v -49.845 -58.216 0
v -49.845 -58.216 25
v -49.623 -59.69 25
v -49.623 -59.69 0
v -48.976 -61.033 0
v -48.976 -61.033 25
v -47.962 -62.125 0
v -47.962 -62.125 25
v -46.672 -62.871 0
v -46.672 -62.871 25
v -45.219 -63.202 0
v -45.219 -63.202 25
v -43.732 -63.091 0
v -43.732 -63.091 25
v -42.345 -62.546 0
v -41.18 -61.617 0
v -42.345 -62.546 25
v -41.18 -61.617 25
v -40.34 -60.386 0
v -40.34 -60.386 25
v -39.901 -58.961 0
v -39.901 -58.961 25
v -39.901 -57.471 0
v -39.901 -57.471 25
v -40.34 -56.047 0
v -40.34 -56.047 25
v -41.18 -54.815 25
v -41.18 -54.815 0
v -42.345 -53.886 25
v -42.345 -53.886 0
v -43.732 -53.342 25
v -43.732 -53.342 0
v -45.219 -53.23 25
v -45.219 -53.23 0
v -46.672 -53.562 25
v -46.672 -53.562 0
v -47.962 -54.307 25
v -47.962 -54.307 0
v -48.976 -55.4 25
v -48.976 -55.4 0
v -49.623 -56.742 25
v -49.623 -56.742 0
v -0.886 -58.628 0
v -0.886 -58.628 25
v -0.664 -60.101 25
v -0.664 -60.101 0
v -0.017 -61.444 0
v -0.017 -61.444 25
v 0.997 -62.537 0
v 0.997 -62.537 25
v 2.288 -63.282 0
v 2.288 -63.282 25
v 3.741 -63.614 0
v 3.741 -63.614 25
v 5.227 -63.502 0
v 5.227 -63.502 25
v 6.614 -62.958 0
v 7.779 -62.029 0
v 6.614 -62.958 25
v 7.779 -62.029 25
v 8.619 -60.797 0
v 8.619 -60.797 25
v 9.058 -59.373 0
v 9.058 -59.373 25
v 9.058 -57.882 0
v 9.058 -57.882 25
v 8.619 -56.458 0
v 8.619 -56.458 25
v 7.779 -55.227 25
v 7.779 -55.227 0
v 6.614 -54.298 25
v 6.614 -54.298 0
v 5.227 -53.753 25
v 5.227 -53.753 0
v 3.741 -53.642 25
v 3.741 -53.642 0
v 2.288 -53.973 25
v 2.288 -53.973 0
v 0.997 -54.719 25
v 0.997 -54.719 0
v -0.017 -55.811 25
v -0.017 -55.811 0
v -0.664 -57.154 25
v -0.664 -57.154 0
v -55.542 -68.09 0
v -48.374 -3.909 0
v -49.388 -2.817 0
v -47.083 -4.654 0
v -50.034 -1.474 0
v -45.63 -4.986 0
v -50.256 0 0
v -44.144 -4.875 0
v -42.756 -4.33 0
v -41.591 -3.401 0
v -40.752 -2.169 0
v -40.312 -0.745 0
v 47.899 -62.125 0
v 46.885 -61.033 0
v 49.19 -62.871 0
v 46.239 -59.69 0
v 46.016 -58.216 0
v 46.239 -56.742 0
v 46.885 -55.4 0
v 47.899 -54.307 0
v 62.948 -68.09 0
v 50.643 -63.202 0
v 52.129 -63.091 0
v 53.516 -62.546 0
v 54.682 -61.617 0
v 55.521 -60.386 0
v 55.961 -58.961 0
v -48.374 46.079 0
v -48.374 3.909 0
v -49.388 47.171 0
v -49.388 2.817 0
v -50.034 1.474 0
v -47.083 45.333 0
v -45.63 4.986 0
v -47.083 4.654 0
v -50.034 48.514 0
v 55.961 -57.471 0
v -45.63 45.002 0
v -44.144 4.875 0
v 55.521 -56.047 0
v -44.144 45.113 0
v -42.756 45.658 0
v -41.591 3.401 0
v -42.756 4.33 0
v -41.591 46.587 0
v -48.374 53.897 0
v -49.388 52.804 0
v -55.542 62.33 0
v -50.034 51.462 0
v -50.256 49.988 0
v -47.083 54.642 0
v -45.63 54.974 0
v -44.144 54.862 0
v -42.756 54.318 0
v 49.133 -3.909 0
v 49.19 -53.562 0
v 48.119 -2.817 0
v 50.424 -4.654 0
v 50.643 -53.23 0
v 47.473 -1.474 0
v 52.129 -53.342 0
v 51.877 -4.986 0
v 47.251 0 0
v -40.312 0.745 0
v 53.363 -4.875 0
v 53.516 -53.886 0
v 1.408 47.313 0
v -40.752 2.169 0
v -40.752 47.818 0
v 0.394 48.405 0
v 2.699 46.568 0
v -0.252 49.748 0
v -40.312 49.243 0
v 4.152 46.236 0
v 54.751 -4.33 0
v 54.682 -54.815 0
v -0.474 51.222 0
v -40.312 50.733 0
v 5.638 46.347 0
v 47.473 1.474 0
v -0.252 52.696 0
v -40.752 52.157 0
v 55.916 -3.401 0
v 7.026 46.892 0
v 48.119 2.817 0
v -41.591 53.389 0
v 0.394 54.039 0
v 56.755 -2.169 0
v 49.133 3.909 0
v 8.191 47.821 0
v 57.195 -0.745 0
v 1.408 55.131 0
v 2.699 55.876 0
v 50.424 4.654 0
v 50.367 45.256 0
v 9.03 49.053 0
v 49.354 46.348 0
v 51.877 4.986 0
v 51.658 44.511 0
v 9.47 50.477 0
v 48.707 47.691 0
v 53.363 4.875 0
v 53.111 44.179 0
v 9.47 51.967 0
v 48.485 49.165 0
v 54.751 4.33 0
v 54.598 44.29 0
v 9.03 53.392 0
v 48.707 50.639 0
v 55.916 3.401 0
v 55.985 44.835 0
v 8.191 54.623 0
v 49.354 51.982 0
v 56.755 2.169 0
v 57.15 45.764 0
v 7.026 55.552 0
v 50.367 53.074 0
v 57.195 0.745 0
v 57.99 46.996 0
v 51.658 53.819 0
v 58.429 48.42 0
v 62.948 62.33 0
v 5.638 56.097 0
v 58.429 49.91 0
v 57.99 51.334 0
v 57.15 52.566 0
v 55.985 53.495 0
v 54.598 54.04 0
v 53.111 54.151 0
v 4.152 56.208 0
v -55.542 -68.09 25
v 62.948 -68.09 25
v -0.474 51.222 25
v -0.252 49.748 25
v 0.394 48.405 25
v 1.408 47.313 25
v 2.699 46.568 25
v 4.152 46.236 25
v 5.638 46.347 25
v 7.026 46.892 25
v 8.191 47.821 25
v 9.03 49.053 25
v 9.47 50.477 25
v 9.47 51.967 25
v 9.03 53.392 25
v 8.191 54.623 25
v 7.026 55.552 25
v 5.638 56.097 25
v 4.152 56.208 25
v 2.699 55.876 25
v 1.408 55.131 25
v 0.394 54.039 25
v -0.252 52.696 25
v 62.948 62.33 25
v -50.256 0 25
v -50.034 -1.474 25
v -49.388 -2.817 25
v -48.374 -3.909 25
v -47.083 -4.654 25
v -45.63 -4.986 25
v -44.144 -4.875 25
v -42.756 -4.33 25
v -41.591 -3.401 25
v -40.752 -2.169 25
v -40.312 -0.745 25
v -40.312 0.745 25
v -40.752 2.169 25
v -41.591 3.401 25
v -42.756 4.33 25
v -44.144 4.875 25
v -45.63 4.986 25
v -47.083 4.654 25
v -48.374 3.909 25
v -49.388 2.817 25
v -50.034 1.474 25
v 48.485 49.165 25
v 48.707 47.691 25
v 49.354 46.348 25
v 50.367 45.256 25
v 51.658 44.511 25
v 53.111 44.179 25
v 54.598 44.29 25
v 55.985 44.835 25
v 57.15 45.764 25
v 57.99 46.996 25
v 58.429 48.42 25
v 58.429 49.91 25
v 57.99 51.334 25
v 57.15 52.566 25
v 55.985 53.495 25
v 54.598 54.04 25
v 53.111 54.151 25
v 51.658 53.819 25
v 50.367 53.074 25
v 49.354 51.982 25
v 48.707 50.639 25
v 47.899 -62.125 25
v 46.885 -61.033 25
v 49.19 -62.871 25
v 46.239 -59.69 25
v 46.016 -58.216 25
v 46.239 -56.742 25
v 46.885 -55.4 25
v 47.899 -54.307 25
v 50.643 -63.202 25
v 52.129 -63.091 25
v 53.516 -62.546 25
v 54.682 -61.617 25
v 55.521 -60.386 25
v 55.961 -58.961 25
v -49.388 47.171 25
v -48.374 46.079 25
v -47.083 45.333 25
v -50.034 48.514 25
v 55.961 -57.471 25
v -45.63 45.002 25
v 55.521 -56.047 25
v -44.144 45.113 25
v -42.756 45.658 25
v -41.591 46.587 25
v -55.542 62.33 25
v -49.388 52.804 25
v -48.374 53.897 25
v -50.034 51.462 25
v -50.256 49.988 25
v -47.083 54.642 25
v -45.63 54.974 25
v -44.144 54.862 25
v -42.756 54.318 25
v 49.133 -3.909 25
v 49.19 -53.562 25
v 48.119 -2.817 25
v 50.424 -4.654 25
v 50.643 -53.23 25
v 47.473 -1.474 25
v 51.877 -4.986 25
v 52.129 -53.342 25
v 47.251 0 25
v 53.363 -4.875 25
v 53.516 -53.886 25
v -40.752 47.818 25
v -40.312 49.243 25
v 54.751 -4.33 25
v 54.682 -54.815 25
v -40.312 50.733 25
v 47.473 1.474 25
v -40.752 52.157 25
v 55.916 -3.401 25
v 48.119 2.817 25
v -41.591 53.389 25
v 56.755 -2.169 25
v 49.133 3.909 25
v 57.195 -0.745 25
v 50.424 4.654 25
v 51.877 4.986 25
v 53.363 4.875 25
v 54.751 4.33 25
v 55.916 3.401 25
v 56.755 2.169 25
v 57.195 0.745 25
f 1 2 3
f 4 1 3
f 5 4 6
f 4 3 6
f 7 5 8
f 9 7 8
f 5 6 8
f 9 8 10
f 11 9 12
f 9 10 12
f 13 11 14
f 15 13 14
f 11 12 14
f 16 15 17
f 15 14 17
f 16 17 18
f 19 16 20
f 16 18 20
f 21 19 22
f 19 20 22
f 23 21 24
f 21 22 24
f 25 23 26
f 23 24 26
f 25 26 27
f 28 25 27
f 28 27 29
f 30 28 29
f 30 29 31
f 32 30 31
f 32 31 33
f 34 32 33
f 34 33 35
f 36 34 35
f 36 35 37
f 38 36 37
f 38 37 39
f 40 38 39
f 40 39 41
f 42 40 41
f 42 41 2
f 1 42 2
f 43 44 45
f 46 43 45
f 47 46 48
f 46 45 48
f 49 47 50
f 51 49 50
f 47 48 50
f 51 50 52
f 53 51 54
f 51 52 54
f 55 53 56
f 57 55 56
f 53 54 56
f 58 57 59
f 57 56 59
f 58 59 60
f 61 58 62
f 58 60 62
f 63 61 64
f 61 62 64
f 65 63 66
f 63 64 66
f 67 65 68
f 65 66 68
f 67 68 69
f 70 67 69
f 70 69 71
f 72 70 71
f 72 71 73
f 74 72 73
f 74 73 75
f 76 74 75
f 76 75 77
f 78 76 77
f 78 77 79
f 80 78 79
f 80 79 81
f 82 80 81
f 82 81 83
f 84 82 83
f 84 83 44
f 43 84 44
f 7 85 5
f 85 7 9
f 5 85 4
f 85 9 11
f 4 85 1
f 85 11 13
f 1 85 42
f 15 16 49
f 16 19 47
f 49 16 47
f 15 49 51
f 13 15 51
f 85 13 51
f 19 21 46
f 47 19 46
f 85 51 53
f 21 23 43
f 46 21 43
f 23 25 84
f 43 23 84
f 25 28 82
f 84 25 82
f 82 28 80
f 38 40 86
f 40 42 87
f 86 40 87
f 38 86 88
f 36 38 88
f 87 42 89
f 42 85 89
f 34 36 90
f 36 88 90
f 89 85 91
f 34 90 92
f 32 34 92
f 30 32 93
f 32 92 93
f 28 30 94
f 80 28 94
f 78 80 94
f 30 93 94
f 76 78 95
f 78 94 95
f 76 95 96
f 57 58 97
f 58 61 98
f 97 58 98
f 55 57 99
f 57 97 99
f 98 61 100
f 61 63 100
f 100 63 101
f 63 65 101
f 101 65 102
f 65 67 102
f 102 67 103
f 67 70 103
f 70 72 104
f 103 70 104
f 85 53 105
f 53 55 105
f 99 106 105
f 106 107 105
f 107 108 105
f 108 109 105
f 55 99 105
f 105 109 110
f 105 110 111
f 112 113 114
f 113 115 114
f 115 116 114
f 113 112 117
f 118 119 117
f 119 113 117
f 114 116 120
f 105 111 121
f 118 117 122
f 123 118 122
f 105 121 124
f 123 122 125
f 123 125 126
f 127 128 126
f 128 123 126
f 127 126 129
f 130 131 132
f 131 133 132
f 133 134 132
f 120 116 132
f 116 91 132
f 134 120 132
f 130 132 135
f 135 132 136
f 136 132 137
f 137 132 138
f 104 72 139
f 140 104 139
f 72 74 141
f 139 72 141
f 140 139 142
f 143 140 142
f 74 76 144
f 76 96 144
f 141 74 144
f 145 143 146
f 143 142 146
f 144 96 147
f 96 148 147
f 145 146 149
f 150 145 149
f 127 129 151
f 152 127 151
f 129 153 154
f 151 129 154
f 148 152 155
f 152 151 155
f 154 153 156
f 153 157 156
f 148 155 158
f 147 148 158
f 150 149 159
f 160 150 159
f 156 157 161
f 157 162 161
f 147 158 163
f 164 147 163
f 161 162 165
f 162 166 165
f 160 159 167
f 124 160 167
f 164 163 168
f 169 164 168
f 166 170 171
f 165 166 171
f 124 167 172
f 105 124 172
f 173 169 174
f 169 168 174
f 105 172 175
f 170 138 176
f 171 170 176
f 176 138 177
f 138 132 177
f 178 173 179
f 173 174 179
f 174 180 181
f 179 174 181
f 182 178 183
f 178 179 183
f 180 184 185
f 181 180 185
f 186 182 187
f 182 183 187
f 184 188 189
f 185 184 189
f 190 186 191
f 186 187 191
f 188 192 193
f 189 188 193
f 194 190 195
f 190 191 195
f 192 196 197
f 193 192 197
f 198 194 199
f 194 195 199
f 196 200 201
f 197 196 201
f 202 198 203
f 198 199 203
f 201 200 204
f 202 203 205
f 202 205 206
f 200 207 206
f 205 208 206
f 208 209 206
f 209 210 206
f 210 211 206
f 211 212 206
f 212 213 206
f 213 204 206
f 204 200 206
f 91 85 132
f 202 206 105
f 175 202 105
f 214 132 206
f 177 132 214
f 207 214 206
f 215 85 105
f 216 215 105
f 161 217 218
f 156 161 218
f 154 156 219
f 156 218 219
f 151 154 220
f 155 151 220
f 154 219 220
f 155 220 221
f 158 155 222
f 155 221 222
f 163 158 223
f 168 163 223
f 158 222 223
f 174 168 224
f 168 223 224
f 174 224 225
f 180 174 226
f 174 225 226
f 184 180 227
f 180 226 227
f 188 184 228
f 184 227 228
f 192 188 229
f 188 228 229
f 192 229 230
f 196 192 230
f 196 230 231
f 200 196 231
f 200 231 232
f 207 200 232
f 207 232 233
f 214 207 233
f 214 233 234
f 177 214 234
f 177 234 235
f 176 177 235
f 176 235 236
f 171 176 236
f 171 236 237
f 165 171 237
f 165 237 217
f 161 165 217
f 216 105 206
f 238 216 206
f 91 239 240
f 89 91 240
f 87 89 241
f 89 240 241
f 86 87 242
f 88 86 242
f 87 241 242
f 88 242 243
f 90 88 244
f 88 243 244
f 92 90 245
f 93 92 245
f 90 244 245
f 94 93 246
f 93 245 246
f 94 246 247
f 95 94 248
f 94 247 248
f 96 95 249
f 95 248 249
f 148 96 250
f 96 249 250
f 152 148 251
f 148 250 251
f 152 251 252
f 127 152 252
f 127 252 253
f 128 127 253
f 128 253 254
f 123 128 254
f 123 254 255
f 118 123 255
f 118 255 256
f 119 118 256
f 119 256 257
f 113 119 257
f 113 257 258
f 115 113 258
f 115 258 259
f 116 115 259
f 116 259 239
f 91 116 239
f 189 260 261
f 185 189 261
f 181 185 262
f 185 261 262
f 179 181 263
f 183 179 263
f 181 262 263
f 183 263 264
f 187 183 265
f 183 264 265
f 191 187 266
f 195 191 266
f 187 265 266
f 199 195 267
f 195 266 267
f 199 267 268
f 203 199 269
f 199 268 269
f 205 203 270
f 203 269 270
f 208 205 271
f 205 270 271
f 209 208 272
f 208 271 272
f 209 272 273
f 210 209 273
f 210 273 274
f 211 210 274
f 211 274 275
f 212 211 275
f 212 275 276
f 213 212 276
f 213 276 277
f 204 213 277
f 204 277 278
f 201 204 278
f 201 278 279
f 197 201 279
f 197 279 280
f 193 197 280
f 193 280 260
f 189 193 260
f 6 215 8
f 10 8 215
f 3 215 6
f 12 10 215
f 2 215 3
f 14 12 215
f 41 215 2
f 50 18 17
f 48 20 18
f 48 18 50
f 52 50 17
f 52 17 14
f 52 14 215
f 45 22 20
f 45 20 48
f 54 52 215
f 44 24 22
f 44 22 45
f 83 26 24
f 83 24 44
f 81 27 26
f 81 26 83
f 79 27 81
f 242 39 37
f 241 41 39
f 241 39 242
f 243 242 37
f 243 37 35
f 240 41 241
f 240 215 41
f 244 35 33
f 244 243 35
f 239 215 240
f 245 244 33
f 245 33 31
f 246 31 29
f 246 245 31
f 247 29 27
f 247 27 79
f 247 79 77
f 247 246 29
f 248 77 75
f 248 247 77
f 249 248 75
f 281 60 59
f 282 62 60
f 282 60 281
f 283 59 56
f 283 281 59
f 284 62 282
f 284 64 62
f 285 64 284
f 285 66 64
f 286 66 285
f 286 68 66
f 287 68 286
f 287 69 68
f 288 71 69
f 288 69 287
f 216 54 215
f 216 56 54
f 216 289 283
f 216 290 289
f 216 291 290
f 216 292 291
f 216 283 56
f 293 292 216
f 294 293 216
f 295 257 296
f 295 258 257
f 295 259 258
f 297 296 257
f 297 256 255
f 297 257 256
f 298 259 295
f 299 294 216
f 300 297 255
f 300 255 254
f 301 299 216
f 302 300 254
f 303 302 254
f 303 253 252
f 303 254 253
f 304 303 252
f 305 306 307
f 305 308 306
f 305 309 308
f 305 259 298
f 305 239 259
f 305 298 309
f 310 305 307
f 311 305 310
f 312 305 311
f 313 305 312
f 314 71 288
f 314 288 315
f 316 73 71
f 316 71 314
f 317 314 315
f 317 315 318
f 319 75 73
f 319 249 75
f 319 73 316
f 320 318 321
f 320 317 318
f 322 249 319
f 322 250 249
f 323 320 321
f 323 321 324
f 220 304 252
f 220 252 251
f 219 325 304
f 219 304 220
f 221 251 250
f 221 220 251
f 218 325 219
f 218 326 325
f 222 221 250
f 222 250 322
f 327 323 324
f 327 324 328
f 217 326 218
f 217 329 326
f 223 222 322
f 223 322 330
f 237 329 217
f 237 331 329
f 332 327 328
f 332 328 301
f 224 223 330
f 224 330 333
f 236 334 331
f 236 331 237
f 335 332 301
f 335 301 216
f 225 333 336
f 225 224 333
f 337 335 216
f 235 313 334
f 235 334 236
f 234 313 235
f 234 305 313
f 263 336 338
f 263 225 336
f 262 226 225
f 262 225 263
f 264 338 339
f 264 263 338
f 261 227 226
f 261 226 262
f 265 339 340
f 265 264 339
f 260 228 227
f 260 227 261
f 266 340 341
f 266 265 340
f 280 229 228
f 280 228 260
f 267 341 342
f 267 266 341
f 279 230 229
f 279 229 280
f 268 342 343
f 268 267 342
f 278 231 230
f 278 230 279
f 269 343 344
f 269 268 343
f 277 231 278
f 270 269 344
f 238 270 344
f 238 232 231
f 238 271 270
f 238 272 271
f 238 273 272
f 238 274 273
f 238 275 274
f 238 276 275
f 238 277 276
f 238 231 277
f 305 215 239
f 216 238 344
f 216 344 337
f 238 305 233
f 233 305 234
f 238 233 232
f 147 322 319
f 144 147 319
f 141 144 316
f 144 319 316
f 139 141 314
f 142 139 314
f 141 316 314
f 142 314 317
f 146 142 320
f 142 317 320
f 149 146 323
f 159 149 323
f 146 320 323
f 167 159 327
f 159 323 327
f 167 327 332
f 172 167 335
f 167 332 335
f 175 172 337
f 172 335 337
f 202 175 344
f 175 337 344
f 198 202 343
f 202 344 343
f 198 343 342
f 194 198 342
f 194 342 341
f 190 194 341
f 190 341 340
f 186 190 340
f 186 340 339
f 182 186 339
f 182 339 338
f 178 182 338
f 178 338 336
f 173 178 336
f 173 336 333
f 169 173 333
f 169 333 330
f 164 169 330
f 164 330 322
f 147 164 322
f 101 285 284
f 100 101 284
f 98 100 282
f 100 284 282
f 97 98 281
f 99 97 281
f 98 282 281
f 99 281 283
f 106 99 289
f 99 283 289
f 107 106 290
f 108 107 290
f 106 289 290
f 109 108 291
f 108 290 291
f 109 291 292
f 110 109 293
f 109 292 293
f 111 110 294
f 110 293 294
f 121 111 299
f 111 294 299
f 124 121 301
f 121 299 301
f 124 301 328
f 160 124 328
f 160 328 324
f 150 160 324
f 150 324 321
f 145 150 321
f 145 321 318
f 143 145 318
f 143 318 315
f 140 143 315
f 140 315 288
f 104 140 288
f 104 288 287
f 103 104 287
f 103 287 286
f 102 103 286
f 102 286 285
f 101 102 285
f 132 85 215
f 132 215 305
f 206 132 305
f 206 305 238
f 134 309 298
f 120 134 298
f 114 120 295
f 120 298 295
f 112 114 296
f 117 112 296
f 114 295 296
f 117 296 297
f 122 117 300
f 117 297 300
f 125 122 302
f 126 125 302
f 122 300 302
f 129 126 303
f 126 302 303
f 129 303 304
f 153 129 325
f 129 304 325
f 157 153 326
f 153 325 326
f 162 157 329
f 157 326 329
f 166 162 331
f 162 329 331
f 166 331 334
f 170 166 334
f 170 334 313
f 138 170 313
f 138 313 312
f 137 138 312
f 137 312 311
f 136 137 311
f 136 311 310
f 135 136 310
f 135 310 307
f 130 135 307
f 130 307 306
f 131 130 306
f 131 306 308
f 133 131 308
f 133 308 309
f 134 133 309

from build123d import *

# Parameters (mm, degrees)
F0_W     = 118.4896603227
F0_H     = 130.4209120572
F1_DEPTH = 25
F2_D     = 10


with BuildPart() as f1:
    # F0 (on Top) → F1 (new body)
    with BuildSketch(Plane.XY):
        with Locations((3.7028007209, -2.8799604625)):
            Rectangle(F0_W, F0_H)
    extrude(amount=F1_DEPTH)

    # F2 (through all)
    with Locations(Plane(origin=(0, 0, 0), x_dir=(1, 0, 0), z_dir=(0, 0, -1))):
        with Locations((-45.2564693987, -49.9878264964), (4.52564843, -51.2220934033), (53.484916687, -49.1649806499), (52.2506535053, 0), (51.0163828731, 58.2162737846), (4.1142245755, 58.6276985705), (-44.8450483382, 58.2162737846), (-45.2564693987, 0)):
            Hole(F2_D / 2)


solid = f1.part
